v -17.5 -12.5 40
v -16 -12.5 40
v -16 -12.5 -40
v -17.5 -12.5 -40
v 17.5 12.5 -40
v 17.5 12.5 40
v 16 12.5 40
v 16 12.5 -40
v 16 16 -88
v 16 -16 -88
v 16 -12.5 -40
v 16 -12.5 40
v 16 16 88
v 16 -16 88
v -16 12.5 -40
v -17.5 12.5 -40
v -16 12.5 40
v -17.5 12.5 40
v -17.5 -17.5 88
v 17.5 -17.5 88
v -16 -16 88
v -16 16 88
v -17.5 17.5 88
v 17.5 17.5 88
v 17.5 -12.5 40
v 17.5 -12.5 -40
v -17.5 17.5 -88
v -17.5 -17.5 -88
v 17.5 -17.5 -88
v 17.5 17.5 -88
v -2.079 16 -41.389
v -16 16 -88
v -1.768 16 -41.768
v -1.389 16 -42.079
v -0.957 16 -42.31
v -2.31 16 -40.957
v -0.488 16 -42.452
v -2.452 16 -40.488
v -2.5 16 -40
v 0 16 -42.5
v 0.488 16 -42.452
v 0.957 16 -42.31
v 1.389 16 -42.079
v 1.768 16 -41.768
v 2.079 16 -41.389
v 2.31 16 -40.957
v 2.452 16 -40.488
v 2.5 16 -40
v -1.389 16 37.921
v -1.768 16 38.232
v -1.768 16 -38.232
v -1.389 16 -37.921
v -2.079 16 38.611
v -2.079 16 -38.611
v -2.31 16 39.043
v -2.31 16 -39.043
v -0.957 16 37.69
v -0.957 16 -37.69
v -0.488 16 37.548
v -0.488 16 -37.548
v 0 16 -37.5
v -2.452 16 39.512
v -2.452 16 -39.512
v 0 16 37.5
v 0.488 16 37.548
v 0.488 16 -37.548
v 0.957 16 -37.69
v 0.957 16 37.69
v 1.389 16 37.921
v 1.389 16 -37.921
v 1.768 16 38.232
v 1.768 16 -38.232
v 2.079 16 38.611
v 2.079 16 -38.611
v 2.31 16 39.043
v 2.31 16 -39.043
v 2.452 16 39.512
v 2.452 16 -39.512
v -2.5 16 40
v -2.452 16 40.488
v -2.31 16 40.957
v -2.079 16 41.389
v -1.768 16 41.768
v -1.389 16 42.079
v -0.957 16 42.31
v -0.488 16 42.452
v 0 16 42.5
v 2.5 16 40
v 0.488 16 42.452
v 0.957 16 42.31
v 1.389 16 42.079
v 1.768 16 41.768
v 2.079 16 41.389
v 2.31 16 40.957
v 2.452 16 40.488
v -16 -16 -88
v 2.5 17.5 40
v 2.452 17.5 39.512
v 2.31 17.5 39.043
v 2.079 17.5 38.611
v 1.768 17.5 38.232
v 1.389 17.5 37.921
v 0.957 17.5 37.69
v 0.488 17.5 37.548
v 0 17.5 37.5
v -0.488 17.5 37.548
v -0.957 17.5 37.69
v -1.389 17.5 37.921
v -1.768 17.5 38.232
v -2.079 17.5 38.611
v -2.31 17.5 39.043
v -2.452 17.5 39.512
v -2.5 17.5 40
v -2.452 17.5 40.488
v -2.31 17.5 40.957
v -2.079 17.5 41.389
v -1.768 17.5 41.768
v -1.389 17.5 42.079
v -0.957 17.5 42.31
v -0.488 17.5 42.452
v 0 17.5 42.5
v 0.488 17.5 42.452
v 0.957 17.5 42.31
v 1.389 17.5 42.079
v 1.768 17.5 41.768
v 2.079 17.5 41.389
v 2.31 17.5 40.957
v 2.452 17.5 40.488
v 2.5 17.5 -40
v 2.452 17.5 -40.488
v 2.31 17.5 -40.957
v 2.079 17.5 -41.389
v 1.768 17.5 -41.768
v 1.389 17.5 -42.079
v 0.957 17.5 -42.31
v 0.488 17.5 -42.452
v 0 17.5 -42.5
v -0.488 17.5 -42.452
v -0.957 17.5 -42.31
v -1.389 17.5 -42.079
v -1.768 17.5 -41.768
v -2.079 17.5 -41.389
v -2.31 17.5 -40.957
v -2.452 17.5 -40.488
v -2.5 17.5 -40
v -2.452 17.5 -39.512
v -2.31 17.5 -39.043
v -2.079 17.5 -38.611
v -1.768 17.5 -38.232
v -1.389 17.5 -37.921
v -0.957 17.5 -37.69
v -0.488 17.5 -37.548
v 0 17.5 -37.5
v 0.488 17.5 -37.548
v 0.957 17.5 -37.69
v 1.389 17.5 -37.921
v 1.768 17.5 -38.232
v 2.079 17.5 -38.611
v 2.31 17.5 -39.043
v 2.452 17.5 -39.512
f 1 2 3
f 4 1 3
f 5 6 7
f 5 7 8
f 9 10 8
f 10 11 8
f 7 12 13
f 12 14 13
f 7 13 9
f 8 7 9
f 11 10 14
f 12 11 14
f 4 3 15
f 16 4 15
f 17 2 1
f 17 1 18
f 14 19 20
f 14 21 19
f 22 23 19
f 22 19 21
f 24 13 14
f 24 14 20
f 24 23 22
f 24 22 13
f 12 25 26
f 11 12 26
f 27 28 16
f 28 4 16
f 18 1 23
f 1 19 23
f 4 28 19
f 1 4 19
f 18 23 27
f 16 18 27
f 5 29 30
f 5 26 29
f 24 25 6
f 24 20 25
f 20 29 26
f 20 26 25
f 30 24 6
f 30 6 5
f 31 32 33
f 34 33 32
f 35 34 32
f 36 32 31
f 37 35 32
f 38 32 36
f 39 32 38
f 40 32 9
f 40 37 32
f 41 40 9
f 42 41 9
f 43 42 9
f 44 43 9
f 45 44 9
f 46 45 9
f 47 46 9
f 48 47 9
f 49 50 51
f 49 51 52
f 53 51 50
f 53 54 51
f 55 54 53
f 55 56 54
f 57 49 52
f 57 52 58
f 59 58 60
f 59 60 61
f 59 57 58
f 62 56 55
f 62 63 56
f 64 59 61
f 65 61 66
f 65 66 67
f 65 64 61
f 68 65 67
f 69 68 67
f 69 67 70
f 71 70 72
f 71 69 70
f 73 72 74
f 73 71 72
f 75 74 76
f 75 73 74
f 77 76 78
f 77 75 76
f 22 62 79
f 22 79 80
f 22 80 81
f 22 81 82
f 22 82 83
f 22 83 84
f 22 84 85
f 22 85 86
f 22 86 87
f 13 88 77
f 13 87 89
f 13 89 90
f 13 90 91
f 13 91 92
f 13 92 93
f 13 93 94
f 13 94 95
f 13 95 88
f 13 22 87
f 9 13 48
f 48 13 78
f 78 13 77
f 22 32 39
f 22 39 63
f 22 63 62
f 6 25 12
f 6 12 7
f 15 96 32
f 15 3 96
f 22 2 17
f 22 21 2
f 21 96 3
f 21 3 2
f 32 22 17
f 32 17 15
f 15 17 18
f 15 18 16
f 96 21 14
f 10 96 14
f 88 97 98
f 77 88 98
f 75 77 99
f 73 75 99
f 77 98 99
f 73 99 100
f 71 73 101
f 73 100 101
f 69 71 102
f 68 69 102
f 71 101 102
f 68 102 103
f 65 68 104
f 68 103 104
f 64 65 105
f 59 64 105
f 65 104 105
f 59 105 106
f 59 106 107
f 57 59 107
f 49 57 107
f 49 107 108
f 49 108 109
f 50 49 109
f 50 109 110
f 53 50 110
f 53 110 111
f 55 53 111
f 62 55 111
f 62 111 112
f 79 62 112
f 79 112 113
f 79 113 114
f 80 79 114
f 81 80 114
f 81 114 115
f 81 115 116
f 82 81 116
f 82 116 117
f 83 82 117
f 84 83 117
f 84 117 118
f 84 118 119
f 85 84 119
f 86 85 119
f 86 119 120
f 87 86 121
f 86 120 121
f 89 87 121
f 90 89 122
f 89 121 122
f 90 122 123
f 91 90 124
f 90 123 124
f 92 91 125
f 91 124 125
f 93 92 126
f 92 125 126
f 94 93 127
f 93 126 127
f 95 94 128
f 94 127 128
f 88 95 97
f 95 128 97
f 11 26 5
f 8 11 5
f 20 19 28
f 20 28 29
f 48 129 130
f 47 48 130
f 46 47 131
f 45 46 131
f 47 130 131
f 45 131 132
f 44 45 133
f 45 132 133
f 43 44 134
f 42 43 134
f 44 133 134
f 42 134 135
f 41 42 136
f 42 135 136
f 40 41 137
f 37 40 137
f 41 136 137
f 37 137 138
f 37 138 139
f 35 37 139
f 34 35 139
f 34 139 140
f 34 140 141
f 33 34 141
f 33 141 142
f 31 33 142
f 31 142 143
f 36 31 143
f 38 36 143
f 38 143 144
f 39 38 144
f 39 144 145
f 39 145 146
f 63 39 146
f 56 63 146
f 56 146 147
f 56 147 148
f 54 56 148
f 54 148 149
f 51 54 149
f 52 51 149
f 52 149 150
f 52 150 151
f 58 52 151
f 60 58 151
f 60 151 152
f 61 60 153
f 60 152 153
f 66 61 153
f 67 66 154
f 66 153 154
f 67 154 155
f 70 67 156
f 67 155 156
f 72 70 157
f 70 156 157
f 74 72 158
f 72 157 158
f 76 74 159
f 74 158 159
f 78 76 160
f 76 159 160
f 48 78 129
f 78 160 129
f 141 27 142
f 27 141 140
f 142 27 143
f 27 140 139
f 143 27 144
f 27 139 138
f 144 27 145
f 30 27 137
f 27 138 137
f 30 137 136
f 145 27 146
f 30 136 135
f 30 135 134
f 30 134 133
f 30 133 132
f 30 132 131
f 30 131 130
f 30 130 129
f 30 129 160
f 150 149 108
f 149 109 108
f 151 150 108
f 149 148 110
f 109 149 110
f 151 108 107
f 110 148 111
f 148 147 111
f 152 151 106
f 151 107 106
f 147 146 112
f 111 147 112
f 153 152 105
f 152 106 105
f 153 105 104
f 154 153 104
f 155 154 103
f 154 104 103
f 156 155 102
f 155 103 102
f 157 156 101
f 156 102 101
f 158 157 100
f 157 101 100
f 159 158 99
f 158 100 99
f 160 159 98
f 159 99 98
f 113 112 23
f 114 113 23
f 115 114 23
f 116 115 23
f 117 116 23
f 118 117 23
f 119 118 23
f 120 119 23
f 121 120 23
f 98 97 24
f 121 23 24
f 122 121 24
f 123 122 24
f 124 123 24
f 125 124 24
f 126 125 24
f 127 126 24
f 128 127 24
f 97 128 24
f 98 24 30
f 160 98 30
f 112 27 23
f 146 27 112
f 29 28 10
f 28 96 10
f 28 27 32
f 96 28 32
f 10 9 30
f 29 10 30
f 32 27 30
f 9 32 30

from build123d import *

# Parameters (mm, degrees)
MOTORBLOCKSKETCH_W         = 35
MOTORBLOCKSKETCH_H         = 35
MOTORBLOCKSKETCH_W_2       = 32
MOTORBLOCKSKETCH_H_2       = 32
BOSS_EXTRU_1_DEPTH         = 88
ESQUISSE3_W                = 80
ESQUISSE3_H                = 25
ENL_V_MAT_EXTRU_1_DEPTH    = 36
DRILLLEFTMOTORFIXSKETCH_R  = 2.5
ENL_V_MAT_EXTRU_2_DEPTH    = 5
DRILLRIGHTMOTORFIXSKETCH_R = 2.5
ENL_V_MAT_EXTRU_3_DEPTH    = 5


with BuildPart() as part:
    # MotorBlockSketch → Boss.-Extru.1 (new body, symmetric)
    with BuildSketch(Plane.XY):
        Rectangle(MOTORBLOCKSKETCH_W, MOTORBLOCKSKETCH_H)
        Rectangle(MOTORBLOCKSKETCH_W_2, MOTORBLOCKSKETCH_H_2, mode=Mode.SUBTRACT)
    extrude(amount=BOSS_EXTRU_1_DEPTH, both=True)

    # Esquisse3 → Enlèv. mat.-Extru.1 (cut, through all)
    with BuildSketch(Plane(origin=(17.5, 0, 0), x_dir=(0, 0, -1), z_dir=(1, 0, 0))):
        Rectangle(ESQUISSE3_W, ESQUISSE3_H)
    extrude(amount=-ENL_V_MAT_EXTRU_1_DEPTH, mode=Mode.SUBTRACT)

    # DrillLeftMotorFixSketch → Enlèv. mat.-Extru.2 (cut)
    with BuildSketch(Plane(origin=(0, 17.5, 0), x_dir=(1, 0, 0), z_dir=(0, 1, 0))):
        with Locations((0, 40)):
            Circle(DRILLLEFTMOTORFIXSKETCH_R)
    extrude(amount=-ENL_V_MAT_EXTRU_2_DEPTH, mode=Mode.SUBTRACT)

    # DrillRightMotorFixSketch → Enlèv. mat.-Extru.3 (cut)
    with BuildSketch(Plane(origin=(0, 17.5, 0), x_dir=(1, 0, 0), z_dir=(0, 1, 0))):
        with Locations((0, -40)):
            Circle(DRILLRIGHTMOTORFIXSKETCH_R)
    extrude(amount=-ENL_V_MAT_EXTRU_3_DEPTH, mode=Mode.SUBTRACT)


solid = part.part
